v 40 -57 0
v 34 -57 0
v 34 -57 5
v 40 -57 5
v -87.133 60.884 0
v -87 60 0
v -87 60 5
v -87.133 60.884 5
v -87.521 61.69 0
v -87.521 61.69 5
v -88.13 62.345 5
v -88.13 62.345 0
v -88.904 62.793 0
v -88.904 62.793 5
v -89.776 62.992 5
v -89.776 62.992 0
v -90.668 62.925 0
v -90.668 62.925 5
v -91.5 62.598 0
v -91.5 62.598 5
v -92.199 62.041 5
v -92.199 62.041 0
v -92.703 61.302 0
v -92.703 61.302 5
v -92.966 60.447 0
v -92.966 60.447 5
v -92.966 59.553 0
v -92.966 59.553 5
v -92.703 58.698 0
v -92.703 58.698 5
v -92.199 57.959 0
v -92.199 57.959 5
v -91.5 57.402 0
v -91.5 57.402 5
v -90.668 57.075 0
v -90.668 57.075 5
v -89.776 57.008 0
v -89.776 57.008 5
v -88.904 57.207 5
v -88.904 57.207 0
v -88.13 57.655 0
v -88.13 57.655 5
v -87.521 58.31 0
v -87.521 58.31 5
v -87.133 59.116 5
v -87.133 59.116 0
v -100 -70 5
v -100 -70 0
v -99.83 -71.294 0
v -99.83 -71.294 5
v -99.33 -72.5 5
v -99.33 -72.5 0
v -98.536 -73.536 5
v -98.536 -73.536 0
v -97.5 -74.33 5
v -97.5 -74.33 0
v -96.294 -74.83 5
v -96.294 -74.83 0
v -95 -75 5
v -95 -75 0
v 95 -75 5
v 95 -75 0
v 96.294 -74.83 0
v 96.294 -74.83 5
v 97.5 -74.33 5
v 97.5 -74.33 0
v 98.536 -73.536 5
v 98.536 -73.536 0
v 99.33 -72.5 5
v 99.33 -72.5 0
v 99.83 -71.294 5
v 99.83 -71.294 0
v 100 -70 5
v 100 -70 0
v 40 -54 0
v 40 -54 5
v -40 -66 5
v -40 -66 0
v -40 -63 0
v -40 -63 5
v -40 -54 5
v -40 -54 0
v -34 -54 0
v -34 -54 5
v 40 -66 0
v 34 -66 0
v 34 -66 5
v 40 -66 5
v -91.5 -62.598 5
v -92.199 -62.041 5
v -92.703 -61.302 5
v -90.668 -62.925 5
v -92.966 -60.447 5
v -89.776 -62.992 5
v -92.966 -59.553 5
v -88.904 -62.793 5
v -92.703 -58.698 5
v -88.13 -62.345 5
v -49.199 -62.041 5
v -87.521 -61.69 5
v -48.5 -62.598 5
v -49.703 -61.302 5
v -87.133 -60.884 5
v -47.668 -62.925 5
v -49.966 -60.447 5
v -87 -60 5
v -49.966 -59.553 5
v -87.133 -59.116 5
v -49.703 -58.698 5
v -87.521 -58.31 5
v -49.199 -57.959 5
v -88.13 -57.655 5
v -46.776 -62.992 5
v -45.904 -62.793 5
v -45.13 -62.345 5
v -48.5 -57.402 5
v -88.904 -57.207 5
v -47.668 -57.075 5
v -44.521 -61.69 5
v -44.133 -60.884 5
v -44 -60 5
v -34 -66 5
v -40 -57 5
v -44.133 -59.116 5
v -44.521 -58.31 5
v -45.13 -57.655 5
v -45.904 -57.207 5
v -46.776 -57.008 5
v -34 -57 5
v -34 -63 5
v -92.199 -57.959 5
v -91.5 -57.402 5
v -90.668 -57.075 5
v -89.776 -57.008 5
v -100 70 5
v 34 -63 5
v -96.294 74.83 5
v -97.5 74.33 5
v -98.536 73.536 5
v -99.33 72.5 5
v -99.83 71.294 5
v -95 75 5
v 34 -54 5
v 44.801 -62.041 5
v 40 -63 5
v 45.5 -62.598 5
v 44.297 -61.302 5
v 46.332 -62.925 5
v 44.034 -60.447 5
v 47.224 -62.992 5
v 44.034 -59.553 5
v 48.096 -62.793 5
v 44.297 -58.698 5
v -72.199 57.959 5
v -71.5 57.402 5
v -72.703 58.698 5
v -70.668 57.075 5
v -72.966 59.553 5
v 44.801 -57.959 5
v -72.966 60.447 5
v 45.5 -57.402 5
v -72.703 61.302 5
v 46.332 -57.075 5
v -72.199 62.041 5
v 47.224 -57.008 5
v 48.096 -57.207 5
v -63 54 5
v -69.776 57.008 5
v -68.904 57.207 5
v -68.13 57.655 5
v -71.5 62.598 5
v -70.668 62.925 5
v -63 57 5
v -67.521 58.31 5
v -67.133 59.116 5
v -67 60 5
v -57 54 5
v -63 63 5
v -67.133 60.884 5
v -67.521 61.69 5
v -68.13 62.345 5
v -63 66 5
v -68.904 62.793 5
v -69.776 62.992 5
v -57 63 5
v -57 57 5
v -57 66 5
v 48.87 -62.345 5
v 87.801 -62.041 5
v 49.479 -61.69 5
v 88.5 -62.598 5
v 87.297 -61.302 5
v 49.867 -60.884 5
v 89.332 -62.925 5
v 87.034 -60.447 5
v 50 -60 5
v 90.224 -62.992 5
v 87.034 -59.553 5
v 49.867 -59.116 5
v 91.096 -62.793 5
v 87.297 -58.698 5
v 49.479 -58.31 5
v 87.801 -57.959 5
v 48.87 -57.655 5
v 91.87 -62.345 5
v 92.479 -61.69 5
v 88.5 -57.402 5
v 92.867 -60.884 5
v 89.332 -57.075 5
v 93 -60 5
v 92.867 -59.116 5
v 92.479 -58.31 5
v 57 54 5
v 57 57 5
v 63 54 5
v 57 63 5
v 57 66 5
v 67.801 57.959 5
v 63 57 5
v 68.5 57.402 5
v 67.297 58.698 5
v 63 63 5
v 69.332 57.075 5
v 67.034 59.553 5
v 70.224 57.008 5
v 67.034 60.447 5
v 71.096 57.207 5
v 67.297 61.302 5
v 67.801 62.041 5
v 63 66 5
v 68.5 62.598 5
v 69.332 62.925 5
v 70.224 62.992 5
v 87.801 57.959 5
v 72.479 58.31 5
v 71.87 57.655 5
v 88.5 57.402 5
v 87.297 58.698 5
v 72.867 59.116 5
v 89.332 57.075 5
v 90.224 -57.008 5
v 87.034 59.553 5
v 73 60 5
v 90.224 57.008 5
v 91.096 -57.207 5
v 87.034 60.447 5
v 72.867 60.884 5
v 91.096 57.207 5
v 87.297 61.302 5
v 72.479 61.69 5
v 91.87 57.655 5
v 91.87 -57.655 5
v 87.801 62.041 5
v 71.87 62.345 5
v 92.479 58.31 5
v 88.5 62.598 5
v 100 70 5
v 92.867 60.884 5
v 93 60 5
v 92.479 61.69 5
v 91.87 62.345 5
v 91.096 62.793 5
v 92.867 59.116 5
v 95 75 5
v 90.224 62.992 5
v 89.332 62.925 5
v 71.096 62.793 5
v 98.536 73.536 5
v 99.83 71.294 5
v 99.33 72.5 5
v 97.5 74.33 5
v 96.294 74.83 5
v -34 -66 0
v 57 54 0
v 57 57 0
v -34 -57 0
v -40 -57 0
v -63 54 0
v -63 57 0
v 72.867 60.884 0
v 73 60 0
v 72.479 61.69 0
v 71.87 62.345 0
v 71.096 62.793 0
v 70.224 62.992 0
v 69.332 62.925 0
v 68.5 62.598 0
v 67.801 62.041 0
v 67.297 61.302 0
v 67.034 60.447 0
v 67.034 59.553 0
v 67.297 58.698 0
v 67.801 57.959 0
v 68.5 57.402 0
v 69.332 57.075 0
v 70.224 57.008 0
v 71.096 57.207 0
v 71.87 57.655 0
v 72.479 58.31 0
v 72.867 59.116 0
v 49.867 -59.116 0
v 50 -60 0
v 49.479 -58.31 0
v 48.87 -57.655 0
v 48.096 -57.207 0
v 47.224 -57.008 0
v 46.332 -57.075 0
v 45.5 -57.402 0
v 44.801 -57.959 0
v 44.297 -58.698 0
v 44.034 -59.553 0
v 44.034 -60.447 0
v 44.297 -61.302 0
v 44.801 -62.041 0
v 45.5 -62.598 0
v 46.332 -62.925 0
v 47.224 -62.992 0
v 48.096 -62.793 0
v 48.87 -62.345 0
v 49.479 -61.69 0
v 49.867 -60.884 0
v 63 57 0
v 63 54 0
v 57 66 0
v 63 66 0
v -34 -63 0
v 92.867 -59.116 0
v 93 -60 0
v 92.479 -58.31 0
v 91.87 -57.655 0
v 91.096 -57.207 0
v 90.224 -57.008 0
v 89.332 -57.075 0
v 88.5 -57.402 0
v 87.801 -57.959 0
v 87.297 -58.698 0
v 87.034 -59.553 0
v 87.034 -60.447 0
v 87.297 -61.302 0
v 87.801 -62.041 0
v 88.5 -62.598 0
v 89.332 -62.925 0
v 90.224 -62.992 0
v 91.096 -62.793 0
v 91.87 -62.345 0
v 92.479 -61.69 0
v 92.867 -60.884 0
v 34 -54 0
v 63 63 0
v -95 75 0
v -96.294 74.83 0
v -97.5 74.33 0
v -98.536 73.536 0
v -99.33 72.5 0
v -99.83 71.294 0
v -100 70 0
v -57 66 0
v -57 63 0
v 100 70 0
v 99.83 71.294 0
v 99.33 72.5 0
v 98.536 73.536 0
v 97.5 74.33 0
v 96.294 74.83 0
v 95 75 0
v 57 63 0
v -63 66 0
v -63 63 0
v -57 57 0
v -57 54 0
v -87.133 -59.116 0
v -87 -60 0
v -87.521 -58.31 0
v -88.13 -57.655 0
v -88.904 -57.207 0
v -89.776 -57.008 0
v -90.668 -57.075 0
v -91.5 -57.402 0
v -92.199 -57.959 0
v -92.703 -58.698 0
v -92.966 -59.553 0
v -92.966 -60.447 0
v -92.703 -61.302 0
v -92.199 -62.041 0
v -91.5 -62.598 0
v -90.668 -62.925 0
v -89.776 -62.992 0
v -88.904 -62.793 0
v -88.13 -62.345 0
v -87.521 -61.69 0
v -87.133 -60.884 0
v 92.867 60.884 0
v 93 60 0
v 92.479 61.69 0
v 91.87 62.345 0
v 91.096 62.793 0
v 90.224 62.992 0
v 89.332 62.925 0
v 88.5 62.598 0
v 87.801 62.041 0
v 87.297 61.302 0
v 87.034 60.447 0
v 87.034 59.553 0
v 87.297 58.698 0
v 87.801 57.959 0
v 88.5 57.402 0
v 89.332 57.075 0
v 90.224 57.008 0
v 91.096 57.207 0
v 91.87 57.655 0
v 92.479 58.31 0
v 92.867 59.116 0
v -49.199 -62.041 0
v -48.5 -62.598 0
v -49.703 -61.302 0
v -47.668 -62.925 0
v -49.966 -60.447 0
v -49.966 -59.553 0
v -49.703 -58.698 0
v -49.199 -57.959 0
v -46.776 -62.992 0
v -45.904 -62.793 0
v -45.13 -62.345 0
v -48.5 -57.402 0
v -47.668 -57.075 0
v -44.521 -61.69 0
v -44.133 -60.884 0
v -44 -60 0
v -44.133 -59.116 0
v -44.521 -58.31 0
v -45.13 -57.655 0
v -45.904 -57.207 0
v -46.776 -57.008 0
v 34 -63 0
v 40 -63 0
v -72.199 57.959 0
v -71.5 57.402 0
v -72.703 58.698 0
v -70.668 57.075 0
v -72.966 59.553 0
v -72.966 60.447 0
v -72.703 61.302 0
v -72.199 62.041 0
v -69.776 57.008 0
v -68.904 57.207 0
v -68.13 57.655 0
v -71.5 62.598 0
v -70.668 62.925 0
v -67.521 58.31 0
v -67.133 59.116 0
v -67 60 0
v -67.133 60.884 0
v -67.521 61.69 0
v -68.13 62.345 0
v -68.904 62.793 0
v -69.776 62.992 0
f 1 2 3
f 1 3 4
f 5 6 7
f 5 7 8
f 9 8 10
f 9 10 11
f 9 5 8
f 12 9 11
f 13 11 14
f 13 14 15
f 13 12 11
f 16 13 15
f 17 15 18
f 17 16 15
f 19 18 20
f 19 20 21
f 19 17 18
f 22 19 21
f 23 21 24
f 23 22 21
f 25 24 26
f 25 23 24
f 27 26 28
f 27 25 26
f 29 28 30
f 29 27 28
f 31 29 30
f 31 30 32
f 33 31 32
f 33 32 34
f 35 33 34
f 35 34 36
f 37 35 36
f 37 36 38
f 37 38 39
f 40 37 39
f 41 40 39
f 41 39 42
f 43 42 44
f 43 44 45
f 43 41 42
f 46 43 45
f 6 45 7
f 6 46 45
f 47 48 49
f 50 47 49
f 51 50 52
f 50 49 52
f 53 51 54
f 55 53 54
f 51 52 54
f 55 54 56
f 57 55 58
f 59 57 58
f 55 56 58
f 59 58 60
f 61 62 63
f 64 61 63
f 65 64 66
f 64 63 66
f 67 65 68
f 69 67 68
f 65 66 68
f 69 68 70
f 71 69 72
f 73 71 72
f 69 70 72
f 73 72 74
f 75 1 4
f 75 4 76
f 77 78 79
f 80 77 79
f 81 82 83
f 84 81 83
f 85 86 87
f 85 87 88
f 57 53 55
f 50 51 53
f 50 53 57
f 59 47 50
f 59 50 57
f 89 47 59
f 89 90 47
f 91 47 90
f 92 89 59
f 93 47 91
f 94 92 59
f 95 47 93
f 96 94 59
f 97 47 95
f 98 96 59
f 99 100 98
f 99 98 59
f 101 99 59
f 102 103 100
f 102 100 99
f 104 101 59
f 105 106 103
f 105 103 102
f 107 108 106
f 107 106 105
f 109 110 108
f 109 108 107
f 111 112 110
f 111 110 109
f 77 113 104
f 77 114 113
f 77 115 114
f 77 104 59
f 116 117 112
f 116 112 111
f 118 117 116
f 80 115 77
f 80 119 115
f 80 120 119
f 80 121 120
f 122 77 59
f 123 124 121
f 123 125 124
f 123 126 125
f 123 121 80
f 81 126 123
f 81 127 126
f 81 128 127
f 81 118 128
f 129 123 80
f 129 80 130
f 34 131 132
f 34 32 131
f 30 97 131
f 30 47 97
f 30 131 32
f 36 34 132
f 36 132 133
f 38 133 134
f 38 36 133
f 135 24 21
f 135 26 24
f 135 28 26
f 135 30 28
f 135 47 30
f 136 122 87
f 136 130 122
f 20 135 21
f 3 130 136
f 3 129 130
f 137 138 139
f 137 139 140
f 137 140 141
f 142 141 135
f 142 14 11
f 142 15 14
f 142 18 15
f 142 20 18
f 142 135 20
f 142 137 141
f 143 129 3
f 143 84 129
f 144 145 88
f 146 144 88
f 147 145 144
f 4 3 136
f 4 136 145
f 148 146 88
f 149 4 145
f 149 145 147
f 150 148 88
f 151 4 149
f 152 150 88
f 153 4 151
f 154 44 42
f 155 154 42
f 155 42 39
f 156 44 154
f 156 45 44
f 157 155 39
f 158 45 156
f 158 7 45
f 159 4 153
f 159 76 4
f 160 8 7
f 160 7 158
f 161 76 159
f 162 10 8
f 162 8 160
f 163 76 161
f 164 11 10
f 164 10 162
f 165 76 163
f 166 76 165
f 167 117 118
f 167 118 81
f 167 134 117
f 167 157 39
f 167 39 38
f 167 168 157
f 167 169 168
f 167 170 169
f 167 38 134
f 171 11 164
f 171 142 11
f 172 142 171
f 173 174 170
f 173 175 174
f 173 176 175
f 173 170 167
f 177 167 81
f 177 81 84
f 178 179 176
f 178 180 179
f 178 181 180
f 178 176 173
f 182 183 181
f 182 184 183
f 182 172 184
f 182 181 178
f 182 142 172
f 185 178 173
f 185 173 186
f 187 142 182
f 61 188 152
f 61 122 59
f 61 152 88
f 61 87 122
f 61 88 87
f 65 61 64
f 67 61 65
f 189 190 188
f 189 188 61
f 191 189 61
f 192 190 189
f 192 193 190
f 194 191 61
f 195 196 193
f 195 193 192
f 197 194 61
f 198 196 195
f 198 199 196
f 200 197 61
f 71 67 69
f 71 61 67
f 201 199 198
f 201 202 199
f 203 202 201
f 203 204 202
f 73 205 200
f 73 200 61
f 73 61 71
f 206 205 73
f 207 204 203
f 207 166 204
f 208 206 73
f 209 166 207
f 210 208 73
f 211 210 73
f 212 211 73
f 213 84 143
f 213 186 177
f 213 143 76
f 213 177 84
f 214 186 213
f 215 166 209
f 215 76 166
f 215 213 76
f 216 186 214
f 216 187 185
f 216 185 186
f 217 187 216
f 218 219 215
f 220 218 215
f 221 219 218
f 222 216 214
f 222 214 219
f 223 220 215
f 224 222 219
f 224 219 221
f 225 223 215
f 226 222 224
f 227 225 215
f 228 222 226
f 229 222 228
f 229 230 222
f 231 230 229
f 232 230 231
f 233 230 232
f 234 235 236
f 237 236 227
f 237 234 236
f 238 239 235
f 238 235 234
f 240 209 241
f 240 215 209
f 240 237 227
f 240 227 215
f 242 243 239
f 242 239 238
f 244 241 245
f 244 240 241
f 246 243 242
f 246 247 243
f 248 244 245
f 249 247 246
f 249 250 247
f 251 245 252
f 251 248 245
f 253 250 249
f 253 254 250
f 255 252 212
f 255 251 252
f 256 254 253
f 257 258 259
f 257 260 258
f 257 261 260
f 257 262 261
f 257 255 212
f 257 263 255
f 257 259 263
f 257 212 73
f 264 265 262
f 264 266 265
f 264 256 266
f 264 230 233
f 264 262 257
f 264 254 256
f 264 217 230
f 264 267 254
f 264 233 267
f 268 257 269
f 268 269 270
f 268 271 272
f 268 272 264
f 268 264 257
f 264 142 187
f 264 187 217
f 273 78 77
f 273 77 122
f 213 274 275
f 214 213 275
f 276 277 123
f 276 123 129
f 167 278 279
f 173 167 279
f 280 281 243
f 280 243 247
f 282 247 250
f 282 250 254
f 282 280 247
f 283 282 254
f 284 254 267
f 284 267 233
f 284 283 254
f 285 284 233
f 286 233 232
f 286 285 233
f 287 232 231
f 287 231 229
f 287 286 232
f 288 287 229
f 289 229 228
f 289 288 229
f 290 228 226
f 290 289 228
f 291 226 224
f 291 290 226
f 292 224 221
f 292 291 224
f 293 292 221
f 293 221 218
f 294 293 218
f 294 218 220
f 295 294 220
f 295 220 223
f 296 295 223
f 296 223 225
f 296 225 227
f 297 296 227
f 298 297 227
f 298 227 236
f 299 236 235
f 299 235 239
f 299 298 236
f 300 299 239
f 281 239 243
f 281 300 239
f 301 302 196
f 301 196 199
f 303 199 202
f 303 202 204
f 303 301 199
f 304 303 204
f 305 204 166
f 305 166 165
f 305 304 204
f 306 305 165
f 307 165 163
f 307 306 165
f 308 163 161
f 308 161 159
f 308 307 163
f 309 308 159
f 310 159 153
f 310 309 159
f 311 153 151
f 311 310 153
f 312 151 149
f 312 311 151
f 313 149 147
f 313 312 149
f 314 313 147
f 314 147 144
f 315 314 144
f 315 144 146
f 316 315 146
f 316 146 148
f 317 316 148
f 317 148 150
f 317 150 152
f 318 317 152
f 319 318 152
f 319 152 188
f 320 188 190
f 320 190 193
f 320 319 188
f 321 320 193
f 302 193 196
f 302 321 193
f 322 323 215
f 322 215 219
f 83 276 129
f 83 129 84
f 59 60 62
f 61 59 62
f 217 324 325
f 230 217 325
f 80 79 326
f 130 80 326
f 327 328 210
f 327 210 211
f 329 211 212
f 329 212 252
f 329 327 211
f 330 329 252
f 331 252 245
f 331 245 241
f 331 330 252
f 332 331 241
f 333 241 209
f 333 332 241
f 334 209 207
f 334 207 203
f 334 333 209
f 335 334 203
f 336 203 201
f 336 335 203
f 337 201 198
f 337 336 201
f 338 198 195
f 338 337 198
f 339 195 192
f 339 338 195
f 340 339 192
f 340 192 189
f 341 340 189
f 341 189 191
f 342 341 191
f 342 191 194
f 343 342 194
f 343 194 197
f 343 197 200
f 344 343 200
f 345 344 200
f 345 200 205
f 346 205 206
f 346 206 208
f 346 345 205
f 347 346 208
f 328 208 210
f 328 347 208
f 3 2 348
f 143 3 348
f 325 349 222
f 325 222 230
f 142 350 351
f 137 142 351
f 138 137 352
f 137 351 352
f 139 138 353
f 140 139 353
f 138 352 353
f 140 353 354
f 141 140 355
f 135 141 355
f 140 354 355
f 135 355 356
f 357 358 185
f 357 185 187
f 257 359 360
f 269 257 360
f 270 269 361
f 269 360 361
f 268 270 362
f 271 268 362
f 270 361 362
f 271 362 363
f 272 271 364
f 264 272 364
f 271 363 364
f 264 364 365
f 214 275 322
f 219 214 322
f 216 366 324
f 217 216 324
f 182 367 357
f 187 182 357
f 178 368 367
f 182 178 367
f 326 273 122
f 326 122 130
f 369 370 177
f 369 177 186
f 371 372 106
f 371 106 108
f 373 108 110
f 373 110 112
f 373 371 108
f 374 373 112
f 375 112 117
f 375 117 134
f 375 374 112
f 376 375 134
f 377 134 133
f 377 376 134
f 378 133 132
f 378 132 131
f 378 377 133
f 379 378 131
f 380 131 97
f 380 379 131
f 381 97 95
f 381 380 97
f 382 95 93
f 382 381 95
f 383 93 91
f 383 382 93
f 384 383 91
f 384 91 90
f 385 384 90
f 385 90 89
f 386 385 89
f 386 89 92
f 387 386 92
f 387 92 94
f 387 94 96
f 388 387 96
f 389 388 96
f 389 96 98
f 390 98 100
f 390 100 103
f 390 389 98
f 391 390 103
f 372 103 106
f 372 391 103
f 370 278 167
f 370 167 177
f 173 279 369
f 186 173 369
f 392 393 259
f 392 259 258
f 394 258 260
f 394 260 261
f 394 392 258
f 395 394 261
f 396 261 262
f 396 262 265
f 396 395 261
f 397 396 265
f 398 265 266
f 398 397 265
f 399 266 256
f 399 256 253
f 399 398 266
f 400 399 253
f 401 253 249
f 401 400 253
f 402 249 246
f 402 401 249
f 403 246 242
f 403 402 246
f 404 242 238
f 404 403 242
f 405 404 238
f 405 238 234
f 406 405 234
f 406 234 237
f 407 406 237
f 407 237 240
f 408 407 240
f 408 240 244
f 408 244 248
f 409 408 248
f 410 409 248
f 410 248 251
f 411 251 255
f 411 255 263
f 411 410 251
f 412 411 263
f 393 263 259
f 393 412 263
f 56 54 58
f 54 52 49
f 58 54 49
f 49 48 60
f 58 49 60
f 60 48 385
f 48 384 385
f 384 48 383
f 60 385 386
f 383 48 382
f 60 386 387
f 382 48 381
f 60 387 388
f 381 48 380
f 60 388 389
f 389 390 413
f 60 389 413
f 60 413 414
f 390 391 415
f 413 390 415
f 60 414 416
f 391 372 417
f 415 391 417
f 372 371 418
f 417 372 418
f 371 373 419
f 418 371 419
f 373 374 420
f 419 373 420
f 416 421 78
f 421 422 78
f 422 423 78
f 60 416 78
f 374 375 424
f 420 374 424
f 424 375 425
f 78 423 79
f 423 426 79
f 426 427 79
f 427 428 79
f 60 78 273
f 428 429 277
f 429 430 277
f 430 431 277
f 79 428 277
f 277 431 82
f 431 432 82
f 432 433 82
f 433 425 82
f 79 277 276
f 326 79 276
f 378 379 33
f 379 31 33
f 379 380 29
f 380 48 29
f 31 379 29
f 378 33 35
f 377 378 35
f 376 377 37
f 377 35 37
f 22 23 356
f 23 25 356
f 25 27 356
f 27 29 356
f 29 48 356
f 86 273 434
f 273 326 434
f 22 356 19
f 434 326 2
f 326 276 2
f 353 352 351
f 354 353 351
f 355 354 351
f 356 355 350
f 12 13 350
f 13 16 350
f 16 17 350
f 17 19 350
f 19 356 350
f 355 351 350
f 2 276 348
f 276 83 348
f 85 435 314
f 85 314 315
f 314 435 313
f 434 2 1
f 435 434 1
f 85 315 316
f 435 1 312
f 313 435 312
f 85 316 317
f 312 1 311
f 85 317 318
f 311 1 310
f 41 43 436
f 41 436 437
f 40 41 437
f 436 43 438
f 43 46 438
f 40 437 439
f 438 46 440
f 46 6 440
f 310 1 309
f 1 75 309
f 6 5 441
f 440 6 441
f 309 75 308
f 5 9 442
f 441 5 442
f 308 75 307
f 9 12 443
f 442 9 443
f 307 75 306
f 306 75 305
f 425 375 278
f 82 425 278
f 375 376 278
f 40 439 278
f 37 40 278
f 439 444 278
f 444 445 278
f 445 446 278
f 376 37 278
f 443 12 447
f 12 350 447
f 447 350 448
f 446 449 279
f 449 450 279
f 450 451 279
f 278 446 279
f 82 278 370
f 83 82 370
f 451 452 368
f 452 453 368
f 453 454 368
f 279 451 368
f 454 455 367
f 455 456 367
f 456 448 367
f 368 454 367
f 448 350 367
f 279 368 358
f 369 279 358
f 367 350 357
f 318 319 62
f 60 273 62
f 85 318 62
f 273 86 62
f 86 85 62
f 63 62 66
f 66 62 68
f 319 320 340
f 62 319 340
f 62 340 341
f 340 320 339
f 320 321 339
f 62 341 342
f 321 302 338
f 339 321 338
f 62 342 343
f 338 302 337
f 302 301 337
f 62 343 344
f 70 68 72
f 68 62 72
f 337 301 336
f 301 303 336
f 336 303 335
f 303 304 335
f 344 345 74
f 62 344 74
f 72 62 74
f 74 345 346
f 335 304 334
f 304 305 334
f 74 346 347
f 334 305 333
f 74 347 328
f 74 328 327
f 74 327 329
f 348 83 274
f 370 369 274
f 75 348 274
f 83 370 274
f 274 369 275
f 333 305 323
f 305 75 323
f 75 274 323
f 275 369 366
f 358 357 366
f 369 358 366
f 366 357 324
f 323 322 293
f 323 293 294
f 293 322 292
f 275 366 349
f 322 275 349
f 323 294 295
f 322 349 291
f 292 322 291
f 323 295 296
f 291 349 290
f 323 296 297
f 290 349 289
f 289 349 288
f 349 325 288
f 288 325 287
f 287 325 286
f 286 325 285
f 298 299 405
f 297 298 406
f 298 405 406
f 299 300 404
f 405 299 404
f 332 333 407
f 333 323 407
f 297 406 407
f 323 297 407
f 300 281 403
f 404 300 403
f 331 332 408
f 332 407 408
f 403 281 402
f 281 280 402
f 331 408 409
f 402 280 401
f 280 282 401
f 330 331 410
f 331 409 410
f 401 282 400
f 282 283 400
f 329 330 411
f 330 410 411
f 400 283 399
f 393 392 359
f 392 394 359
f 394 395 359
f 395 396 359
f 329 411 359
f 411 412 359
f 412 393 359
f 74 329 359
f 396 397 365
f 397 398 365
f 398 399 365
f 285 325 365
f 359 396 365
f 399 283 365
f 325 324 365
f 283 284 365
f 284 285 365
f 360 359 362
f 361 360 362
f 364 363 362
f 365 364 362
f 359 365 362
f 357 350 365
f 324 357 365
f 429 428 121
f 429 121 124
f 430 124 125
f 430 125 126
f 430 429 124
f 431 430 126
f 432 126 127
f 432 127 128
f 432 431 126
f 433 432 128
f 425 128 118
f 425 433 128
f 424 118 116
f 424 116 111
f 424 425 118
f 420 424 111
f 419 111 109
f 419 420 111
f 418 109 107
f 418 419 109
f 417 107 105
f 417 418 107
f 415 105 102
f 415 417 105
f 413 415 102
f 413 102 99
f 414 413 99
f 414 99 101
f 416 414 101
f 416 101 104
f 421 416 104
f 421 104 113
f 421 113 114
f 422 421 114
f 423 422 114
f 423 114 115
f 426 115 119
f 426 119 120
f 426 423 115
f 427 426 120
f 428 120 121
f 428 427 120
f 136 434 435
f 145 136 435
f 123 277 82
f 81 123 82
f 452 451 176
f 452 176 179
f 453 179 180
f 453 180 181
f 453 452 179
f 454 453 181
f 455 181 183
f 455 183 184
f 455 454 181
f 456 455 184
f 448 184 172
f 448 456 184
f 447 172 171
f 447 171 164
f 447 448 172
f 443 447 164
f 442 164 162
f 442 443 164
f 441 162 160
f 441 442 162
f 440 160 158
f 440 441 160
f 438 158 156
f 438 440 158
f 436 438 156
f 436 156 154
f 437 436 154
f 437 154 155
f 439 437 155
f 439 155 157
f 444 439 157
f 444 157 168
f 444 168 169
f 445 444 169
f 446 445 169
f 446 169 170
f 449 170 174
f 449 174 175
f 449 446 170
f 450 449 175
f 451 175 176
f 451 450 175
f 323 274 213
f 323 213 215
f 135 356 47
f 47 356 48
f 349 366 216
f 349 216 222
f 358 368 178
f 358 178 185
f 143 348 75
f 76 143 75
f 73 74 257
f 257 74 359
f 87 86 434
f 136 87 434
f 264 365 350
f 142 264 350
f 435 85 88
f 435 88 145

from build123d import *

# Parameters (mm, degrees)
F0_R     = 3
F0_W     = 6
F0_H     = 3
F1_DEPTH = 5


with BuildPart() as f1:
    # F0 (on Top) → F1 (new body)
    with BuildSketch(Plane.XY):
        with BuildLine():
            ThreePointArc((100, 70), (98.535534, 73.535534), (95, 75))
            Line((95, 75), (-95, 75))
            ThreePointArc((-95, 75), (-98.535534, 73.535534), (-100, 70))
            Line((-100, 70), (-100, -70))
            ThreePointArc((-100, -70), (-98.535534, -73.535534), (-95, -75))
            Line((-95, -75), (95, -75))
            ThreePointArc((95, -75), (98.535534, -73.535534), (100, -70))
            Line((100, -70), (100, 70))
        make_face()
        with Locations((-90, -60)):
            Circle(F0_R, mode=Mode.SUBTRACT)
        with Locations((-47, -60)):
            Circle(F0_R, mode=Mode.SUBTRACT)
        with Locations((-37, -64.5)):
            Rectangle(F0_W, F0_H, mode=Mode.SUBTRACT)
        with Locations((-37, -55.5)):
            Rectangle(F0_W, F0_H, mode=Mode.SUBTRACT)
        with Locations((37, -64.5)):
            Rectangle(F0_W, F0_H, mode=Mode.SUBTRACT)
        with Locations((47, -60)):
            Circle(F0_R, mode=Mode.SUBTRACT)
        with Locations((37, -55.5)):
            Rectangle(F0_W, F0_H, mode=Mode.SUBTRACT)
        with Locations((90, -60)):
            Circle(F0_R, mode=Mode.SUBTRACT)
        with Locations((-60, 55.5)):
            Rectangle(F0_W, F0_H, mode=Mode.SUBTRACT)
        with Locations((-90, 60)):
            Circle(F0_R, mode=Mode.SUBTRACT)
        with Locations((-70, 60)):
            Circle(F0_R, mode=Mode.SUBTRACT)
        with Locations((-60, 64.5)):
            Rectangle(F0_W, F0_H, mode=Mode.SUBTRACT)
        with Locations((60, 55.5)):
            Rectangle(F0_W, F0_H, mode=Mode.SUBTRACT)
        with Locations((60, 64.5)):
            Rectangle(F0_W, F0_H, mode=Mode.SUBTRACT)
        with Locations((70, 60)):
            Circle(F0_R, mode=Mode.SUBTRACT)
        with Locations((90, 60)):
            Circle(F0_R, mode=Mode.SUBTRACT)
    extrude(amount=F1_DEPTH)


solid = f1.part
